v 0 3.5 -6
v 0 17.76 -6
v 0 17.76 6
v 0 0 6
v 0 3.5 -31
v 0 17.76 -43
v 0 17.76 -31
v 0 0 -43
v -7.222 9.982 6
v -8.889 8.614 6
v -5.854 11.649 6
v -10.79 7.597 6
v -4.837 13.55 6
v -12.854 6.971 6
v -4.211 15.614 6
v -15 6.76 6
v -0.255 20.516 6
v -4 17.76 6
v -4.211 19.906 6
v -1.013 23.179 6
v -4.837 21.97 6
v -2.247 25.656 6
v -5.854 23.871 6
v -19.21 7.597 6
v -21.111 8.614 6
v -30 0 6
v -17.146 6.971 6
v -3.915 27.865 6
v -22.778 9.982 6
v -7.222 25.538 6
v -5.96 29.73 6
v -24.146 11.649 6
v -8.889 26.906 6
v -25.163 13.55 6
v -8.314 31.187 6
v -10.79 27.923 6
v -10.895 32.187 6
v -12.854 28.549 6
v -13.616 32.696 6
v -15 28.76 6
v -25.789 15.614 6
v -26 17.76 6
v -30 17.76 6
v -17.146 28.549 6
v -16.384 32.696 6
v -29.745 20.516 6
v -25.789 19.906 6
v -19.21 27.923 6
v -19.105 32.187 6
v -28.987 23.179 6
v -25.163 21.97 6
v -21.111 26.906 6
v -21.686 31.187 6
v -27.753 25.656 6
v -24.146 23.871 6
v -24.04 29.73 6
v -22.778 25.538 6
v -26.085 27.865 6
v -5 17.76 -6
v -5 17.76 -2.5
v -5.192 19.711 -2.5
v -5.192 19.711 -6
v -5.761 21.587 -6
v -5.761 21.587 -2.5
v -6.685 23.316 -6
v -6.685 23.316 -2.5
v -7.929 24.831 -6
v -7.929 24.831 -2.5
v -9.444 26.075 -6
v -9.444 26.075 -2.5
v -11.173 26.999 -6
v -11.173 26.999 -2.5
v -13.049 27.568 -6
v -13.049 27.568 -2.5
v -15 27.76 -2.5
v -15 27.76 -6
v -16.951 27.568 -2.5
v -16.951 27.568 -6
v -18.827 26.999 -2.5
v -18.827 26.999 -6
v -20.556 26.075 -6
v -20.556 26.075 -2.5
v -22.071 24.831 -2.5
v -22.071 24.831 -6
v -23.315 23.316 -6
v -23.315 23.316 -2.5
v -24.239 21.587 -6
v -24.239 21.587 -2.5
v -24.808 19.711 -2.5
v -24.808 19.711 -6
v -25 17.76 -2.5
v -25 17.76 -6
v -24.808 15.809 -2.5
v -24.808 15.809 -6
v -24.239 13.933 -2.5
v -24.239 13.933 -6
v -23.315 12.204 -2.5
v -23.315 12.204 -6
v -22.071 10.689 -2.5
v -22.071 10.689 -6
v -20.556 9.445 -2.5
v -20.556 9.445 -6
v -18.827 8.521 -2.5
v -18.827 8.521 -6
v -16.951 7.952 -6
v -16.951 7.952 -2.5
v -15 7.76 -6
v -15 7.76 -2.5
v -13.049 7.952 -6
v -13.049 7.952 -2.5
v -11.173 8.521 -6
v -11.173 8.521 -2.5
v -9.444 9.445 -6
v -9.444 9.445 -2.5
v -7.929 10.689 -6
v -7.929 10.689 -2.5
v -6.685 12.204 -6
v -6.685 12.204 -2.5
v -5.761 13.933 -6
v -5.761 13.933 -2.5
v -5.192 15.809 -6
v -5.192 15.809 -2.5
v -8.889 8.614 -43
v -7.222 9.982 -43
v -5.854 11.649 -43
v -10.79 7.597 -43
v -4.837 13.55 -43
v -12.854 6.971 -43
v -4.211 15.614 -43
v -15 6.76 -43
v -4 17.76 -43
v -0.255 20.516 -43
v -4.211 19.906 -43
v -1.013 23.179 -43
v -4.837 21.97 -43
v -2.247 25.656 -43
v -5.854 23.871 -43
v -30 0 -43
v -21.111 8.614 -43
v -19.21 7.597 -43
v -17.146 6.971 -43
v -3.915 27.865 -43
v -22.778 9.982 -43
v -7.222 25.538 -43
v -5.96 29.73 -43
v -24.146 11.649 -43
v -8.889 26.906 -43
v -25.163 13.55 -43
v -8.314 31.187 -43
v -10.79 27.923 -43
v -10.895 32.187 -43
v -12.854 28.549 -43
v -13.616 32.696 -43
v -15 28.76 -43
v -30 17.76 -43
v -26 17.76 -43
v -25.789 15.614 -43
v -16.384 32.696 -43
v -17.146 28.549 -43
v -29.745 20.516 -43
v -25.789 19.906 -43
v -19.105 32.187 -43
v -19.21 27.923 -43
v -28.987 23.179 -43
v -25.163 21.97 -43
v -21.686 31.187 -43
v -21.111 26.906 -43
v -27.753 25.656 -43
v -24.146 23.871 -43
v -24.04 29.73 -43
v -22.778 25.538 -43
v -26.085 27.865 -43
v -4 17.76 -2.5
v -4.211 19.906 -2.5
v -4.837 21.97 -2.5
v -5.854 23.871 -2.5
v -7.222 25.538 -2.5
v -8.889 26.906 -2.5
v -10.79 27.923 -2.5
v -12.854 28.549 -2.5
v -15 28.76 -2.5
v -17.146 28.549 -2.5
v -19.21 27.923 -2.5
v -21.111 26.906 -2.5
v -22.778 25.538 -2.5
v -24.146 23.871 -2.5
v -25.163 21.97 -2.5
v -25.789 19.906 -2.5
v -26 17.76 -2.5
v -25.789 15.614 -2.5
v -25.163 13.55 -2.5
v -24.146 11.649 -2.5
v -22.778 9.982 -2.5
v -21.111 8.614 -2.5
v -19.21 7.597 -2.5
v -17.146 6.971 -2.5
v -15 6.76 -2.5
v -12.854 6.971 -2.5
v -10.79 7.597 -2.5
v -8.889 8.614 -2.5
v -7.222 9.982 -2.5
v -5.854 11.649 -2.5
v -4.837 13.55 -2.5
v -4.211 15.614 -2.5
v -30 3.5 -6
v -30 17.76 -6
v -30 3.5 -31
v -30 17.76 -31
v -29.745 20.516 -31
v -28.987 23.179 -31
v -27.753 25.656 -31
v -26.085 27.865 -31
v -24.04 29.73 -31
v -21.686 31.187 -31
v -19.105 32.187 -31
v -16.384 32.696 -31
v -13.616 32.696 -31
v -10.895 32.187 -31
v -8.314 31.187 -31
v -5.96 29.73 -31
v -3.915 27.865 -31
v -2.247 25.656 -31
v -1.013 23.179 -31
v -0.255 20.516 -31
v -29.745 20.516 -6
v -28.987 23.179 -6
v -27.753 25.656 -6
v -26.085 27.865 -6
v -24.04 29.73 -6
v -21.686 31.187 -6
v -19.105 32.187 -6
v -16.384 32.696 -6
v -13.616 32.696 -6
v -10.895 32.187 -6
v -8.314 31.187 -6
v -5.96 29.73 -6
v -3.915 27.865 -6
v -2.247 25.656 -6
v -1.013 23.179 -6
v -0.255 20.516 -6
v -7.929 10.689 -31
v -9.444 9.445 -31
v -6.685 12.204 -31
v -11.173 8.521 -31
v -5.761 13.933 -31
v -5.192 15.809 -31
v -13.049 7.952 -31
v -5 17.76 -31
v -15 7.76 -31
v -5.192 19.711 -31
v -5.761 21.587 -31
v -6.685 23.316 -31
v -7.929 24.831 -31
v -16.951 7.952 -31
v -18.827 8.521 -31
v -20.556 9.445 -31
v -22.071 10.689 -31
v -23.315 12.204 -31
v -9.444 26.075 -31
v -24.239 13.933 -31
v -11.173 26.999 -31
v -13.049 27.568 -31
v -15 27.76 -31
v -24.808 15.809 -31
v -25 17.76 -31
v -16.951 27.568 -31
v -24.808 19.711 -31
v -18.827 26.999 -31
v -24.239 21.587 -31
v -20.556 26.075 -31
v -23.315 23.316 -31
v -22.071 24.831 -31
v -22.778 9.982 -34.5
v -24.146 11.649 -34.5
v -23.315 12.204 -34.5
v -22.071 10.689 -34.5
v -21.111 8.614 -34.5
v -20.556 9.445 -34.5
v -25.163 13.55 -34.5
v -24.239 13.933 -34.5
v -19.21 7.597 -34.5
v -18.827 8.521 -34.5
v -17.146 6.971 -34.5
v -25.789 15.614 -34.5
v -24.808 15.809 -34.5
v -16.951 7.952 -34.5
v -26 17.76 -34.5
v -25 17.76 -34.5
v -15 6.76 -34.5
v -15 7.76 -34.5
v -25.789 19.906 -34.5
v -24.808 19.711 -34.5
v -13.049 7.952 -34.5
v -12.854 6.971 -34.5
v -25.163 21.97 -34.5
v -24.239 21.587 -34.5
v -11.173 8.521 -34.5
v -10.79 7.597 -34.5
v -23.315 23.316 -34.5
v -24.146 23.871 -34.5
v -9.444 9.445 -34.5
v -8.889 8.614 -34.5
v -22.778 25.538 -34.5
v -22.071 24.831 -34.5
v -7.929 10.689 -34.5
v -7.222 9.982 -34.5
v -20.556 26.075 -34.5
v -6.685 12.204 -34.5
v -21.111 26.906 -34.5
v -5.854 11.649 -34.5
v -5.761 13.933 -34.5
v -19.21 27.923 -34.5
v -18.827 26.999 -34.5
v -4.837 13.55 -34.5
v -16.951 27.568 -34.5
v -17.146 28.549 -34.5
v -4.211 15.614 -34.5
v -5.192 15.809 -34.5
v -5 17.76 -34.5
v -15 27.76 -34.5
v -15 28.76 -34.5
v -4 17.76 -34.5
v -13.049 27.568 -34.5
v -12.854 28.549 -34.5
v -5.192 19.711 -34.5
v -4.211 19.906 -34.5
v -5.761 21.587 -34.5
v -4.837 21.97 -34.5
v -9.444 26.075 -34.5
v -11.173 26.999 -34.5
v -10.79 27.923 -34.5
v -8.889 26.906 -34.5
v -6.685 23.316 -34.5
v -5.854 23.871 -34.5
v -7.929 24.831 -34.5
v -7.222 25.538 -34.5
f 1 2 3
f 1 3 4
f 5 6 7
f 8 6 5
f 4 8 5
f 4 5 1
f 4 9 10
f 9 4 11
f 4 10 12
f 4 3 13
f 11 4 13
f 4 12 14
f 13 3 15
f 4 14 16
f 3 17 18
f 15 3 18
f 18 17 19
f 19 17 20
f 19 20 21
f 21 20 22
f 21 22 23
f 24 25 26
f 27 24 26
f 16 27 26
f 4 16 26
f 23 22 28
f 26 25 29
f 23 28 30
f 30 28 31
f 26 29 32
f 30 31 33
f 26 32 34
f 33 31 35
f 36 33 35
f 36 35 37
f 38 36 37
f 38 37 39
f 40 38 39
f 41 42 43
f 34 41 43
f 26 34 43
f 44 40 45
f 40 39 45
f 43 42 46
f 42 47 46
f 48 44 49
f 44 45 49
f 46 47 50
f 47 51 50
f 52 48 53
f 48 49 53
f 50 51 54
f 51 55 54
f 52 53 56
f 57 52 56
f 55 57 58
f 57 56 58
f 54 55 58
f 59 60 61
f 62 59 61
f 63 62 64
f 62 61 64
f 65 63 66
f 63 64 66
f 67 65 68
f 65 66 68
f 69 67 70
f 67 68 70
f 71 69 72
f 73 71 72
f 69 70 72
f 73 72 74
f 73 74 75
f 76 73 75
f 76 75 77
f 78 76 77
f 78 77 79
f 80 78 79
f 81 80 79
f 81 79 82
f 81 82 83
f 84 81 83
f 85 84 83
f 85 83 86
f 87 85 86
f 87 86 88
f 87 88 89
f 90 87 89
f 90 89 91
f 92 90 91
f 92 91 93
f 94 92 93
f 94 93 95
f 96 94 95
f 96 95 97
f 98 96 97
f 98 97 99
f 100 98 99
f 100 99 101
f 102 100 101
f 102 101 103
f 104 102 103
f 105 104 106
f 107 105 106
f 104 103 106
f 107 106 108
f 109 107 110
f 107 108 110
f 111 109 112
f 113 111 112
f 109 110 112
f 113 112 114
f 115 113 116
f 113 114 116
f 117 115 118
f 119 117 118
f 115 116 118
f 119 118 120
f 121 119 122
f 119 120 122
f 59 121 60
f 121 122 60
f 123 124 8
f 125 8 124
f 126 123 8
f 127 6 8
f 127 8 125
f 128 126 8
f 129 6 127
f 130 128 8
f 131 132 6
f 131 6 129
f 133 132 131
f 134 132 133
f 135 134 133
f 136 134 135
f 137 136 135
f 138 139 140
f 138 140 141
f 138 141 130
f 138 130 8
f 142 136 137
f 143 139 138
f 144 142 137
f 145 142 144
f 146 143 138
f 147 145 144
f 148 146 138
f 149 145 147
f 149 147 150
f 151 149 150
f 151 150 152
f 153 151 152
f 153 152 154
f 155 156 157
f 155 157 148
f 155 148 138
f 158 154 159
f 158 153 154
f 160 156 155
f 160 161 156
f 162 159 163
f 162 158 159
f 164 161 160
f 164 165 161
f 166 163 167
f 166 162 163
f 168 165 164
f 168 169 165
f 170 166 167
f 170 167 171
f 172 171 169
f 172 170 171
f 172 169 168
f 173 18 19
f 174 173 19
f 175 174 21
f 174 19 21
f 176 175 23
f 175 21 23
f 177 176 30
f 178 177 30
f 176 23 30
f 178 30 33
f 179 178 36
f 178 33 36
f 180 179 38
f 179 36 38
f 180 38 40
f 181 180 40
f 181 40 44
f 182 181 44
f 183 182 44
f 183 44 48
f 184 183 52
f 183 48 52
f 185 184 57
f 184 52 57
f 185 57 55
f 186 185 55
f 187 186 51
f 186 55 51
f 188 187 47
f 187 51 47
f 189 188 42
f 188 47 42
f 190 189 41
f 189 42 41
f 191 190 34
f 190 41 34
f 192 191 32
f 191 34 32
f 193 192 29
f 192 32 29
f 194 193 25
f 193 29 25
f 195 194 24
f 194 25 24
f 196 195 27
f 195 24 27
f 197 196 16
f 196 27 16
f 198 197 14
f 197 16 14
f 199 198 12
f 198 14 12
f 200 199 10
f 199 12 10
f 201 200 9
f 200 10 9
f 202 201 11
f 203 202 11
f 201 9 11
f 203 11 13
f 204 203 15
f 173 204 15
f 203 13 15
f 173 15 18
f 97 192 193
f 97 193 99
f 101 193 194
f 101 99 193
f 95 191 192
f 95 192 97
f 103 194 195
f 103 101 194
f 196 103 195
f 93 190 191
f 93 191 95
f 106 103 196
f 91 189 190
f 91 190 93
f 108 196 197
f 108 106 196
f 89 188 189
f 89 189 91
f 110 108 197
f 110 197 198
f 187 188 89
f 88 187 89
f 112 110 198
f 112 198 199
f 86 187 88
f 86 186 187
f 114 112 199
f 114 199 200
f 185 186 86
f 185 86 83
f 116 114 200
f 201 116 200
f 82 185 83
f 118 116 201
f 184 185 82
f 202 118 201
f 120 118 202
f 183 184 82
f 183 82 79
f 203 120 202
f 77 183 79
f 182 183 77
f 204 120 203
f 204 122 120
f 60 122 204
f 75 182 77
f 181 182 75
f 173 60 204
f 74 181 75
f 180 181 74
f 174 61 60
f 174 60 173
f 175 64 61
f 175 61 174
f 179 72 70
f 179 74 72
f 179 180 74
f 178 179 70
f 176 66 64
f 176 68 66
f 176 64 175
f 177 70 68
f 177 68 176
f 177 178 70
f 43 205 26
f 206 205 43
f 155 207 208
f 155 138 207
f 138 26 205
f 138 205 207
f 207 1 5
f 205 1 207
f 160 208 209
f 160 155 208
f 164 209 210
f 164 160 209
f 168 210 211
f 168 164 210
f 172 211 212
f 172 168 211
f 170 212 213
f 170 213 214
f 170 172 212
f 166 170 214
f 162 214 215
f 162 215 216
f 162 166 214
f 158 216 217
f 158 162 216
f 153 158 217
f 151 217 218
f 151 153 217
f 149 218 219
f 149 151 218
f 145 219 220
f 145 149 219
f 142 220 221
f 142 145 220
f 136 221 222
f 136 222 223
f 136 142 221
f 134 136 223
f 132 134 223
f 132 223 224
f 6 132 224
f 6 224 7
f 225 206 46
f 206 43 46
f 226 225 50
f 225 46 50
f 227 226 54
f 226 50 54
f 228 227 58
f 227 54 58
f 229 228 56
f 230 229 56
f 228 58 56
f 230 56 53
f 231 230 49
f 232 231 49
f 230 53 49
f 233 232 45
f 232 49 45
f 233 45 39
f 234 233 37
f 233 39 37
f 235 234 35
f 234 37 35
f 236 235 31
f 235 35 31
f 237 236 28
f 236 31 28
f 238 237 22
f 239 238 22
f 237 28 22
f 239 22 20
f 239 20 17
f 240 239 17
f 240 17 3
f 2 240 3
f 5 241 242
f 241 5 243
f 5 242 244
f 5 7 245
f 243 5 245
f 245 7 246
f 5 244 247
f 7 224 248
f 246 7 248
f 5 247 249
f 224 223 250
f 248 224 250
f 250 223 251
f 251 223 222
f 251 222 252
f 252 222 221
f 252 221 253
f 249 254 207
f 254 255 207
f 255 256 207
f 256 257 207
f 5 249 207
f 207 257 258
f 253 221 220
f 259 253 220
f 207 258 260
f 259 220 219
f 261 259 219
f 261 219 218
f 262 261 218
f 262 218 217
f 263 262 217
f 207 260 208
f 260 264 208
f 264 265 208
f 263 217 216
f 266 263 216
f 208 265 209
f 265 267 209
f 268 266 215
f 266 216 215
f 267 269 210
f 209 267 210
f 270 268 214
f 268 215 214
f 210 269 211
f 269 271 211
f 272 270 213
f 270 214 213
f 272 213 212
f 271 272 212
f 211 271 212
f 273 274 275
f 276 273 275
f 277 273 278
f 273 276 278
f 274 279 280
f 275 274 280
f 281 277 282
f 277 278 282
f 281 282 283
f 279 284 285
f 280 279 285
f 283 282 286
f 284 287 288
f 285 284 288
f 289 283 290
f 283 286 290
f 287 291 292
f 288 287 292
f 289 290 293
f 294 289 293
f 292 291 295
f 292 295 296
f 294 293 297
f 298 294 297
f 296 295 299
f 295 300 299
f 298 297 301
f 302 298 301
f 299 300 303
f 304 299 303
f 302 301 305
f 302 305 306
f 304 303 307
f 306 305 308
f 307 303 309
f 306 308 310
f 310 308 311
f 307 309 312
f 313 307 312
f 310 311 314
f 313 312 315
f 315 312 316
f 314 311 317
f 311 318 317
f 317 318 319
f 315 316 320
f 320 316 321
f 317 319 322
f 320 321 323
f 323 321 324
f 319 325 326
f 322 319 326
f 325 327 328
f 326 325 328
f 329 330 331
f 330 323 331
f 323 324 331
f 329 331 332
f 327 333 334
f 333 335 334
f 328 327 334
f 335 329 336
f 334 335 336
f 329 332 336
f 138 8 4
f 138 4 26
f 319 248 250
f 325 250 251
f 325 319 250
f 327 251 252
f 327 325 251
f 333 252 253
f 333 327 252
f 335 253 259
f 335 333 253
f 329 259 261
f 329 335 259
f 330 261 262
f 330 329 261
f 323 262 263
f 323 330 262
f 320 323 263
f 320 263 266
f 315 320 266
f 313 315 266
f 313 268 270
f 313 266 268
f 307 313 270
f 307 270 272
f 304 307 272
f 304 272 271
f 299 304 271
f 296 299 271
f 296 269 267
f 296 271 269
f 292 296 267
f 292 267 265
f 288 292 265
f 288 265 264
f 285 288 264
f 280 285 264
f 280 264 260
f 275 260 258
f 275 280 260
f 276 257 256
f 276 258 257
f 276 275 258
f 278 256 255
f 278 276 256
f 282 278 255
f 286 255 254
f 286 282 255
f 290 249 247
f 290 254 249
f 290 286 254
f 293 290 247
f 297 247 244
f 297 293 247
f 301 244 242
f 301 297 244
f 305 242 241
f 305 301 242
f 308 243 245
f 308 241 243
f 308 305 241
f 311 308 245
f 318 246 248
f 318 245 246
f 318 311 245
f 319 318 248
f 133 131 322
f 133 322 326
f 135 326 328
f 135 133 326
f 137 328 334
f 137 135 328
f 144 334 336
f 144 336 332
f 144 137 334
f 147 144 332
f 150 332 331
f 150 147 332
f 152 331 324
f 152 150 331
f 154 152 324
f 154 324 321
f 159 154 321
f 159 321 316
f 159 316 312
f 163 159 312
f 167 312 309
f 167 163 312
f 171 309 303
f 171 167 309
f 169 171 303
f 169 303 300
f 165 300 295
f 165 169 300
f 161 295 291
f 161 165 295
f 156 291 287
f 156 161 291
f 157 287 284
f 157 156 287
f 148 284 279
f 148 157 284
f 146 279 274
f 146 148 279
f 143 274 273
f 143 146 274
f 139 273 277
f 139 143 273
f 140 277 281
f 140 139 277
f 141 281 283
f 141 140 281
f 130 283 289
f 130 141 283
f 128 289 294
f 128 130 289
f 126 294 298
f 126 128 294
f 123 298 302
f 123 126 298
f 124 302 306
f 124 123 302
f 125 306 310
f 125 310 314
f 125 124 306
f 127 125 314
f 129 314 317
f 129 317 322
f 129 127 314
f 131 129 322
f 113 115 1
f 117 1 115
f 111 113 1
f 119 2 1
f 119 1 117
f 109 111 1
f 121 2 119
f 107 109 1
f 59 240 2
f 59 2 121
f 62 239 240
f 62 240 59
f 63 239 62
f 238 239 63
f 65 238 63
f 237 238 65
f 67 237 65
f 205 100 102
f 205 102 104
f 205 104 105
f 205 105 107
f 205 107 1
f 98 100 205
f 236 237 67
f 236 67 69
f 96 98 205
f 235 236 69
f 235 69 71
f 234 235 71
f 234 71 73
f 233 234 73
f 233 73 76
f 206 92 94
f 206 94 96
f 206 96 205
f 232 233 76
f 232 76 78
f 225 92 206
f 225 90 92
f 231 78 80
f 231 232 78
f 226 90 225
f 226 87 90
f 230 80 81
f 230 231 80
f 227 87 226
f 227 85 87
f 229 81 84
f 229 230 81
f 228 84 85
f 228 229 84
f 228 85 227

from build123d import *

# Parameters (mm, degrees)
SALIENTE_EXTRUIR1_DEPTH = 6
CROQUIS3_R              = 4
CORTAR_EXTRUIR1_DEPTH   = 47.013232879
CROQUIS4_R              = 11
CORTAR_EXTRUIR2_DEPTH   = 8.5
CROQUIS5_R              = 10
CORTAR_EXTRUIR3_DEPTH   = 8.5
CROQUIS6_W              = 30
CROQUIS6_H              = 3.5
SALIENTE_EXTRUIR2_DEPTH = 25


with BuildPart() as part:
    # Croquis2 → Saliente-Extruir1 (new, symmetric)
    with BuildSketch(Plane.XY):
        with BuildLine():
            Line((0, 0), (-30, 0))
            Line((-30, 0), (-30, 17.76))
            ThreePointArc((-30, 17.76), (-15, 32.76), (0, 17.76))
            Line((0, 17.76), (0, 0))
        make_face()
    saliente_extruir1 = extrude(amount=SALIENTE_EXTRUIR1_DEPTH, both=True)

    # Croquis3 → Cortar-Extruir1 (cut, through all)
    with BuildSketch(Plane.XY.offset(6)):
        with Locations((-15, 17.76)):
            Circle(CROQUIS3_R)
    extrude(amount=-CORTAR_EXTRUIR1_DEPTH, mode=Mode.SUBTRACT)

    # Croquis4 → Cortar-Extruir2 (cut)
    with BuildSketch(Plane.XY.offset(6)):
        with Locations((-15, 17.76)):
            Circle(CROQUIS4_R)
    cortar_extruir2 = extrude(amount=-CORTAR_EXTRUIR2_DEPTH, mode=Mode.SUBTRACT)

    # Croquis5 → Cortar-Extruir3 (cut)
    with BuildSketch(Plane.XY.offset(-2.5)):
        with Locations((-15, 17.76)):
            Circle(CROQUIS5_R)
    cortar_extruir3 = extrude(amount=-CORTAR_EXTRUIR3_DEPTH, mode=Mode.SUBTRACT)

    # Croquis6 → Saliente-Extruir2 (add)
    with BuildSketch(Plane(origin=(0, 0, -6), x_dir=(-1, 0, 0), z_dir=(0, 0, -1))):
        with Locations((15, 1.75)):
            Rectangle(CROQUIS6_W, CROQUIS6_H)
    extrude(amount=SALIENTE_EXTRUIR2_DEPTH)

    # Simetría1: Saliente-Extruir1, Cortar-Extruir2, Cortar-Extruir3 across plane
    add(saliente_extruir1.mirror(Plane(origin=(0, 0, -18.5), x_dir=(1, 0, 0), z_dir=(0, 0, -1))))
    add(cortar_extruir2.mirror(Plane(origin=(0, 0, -18.5), x_dir=(1, 0, 0), z_dir=(0, 0, -1))), mode=Mode.SUBTRACT)
    add(cortar_extruir3.mirror(Plane(origin=(0, 0, -18.5), x_dir=(1, 0, 0), z_dir=(0, 0, -1))), mode=Mode.SUBTRACT)


solid = part.part
